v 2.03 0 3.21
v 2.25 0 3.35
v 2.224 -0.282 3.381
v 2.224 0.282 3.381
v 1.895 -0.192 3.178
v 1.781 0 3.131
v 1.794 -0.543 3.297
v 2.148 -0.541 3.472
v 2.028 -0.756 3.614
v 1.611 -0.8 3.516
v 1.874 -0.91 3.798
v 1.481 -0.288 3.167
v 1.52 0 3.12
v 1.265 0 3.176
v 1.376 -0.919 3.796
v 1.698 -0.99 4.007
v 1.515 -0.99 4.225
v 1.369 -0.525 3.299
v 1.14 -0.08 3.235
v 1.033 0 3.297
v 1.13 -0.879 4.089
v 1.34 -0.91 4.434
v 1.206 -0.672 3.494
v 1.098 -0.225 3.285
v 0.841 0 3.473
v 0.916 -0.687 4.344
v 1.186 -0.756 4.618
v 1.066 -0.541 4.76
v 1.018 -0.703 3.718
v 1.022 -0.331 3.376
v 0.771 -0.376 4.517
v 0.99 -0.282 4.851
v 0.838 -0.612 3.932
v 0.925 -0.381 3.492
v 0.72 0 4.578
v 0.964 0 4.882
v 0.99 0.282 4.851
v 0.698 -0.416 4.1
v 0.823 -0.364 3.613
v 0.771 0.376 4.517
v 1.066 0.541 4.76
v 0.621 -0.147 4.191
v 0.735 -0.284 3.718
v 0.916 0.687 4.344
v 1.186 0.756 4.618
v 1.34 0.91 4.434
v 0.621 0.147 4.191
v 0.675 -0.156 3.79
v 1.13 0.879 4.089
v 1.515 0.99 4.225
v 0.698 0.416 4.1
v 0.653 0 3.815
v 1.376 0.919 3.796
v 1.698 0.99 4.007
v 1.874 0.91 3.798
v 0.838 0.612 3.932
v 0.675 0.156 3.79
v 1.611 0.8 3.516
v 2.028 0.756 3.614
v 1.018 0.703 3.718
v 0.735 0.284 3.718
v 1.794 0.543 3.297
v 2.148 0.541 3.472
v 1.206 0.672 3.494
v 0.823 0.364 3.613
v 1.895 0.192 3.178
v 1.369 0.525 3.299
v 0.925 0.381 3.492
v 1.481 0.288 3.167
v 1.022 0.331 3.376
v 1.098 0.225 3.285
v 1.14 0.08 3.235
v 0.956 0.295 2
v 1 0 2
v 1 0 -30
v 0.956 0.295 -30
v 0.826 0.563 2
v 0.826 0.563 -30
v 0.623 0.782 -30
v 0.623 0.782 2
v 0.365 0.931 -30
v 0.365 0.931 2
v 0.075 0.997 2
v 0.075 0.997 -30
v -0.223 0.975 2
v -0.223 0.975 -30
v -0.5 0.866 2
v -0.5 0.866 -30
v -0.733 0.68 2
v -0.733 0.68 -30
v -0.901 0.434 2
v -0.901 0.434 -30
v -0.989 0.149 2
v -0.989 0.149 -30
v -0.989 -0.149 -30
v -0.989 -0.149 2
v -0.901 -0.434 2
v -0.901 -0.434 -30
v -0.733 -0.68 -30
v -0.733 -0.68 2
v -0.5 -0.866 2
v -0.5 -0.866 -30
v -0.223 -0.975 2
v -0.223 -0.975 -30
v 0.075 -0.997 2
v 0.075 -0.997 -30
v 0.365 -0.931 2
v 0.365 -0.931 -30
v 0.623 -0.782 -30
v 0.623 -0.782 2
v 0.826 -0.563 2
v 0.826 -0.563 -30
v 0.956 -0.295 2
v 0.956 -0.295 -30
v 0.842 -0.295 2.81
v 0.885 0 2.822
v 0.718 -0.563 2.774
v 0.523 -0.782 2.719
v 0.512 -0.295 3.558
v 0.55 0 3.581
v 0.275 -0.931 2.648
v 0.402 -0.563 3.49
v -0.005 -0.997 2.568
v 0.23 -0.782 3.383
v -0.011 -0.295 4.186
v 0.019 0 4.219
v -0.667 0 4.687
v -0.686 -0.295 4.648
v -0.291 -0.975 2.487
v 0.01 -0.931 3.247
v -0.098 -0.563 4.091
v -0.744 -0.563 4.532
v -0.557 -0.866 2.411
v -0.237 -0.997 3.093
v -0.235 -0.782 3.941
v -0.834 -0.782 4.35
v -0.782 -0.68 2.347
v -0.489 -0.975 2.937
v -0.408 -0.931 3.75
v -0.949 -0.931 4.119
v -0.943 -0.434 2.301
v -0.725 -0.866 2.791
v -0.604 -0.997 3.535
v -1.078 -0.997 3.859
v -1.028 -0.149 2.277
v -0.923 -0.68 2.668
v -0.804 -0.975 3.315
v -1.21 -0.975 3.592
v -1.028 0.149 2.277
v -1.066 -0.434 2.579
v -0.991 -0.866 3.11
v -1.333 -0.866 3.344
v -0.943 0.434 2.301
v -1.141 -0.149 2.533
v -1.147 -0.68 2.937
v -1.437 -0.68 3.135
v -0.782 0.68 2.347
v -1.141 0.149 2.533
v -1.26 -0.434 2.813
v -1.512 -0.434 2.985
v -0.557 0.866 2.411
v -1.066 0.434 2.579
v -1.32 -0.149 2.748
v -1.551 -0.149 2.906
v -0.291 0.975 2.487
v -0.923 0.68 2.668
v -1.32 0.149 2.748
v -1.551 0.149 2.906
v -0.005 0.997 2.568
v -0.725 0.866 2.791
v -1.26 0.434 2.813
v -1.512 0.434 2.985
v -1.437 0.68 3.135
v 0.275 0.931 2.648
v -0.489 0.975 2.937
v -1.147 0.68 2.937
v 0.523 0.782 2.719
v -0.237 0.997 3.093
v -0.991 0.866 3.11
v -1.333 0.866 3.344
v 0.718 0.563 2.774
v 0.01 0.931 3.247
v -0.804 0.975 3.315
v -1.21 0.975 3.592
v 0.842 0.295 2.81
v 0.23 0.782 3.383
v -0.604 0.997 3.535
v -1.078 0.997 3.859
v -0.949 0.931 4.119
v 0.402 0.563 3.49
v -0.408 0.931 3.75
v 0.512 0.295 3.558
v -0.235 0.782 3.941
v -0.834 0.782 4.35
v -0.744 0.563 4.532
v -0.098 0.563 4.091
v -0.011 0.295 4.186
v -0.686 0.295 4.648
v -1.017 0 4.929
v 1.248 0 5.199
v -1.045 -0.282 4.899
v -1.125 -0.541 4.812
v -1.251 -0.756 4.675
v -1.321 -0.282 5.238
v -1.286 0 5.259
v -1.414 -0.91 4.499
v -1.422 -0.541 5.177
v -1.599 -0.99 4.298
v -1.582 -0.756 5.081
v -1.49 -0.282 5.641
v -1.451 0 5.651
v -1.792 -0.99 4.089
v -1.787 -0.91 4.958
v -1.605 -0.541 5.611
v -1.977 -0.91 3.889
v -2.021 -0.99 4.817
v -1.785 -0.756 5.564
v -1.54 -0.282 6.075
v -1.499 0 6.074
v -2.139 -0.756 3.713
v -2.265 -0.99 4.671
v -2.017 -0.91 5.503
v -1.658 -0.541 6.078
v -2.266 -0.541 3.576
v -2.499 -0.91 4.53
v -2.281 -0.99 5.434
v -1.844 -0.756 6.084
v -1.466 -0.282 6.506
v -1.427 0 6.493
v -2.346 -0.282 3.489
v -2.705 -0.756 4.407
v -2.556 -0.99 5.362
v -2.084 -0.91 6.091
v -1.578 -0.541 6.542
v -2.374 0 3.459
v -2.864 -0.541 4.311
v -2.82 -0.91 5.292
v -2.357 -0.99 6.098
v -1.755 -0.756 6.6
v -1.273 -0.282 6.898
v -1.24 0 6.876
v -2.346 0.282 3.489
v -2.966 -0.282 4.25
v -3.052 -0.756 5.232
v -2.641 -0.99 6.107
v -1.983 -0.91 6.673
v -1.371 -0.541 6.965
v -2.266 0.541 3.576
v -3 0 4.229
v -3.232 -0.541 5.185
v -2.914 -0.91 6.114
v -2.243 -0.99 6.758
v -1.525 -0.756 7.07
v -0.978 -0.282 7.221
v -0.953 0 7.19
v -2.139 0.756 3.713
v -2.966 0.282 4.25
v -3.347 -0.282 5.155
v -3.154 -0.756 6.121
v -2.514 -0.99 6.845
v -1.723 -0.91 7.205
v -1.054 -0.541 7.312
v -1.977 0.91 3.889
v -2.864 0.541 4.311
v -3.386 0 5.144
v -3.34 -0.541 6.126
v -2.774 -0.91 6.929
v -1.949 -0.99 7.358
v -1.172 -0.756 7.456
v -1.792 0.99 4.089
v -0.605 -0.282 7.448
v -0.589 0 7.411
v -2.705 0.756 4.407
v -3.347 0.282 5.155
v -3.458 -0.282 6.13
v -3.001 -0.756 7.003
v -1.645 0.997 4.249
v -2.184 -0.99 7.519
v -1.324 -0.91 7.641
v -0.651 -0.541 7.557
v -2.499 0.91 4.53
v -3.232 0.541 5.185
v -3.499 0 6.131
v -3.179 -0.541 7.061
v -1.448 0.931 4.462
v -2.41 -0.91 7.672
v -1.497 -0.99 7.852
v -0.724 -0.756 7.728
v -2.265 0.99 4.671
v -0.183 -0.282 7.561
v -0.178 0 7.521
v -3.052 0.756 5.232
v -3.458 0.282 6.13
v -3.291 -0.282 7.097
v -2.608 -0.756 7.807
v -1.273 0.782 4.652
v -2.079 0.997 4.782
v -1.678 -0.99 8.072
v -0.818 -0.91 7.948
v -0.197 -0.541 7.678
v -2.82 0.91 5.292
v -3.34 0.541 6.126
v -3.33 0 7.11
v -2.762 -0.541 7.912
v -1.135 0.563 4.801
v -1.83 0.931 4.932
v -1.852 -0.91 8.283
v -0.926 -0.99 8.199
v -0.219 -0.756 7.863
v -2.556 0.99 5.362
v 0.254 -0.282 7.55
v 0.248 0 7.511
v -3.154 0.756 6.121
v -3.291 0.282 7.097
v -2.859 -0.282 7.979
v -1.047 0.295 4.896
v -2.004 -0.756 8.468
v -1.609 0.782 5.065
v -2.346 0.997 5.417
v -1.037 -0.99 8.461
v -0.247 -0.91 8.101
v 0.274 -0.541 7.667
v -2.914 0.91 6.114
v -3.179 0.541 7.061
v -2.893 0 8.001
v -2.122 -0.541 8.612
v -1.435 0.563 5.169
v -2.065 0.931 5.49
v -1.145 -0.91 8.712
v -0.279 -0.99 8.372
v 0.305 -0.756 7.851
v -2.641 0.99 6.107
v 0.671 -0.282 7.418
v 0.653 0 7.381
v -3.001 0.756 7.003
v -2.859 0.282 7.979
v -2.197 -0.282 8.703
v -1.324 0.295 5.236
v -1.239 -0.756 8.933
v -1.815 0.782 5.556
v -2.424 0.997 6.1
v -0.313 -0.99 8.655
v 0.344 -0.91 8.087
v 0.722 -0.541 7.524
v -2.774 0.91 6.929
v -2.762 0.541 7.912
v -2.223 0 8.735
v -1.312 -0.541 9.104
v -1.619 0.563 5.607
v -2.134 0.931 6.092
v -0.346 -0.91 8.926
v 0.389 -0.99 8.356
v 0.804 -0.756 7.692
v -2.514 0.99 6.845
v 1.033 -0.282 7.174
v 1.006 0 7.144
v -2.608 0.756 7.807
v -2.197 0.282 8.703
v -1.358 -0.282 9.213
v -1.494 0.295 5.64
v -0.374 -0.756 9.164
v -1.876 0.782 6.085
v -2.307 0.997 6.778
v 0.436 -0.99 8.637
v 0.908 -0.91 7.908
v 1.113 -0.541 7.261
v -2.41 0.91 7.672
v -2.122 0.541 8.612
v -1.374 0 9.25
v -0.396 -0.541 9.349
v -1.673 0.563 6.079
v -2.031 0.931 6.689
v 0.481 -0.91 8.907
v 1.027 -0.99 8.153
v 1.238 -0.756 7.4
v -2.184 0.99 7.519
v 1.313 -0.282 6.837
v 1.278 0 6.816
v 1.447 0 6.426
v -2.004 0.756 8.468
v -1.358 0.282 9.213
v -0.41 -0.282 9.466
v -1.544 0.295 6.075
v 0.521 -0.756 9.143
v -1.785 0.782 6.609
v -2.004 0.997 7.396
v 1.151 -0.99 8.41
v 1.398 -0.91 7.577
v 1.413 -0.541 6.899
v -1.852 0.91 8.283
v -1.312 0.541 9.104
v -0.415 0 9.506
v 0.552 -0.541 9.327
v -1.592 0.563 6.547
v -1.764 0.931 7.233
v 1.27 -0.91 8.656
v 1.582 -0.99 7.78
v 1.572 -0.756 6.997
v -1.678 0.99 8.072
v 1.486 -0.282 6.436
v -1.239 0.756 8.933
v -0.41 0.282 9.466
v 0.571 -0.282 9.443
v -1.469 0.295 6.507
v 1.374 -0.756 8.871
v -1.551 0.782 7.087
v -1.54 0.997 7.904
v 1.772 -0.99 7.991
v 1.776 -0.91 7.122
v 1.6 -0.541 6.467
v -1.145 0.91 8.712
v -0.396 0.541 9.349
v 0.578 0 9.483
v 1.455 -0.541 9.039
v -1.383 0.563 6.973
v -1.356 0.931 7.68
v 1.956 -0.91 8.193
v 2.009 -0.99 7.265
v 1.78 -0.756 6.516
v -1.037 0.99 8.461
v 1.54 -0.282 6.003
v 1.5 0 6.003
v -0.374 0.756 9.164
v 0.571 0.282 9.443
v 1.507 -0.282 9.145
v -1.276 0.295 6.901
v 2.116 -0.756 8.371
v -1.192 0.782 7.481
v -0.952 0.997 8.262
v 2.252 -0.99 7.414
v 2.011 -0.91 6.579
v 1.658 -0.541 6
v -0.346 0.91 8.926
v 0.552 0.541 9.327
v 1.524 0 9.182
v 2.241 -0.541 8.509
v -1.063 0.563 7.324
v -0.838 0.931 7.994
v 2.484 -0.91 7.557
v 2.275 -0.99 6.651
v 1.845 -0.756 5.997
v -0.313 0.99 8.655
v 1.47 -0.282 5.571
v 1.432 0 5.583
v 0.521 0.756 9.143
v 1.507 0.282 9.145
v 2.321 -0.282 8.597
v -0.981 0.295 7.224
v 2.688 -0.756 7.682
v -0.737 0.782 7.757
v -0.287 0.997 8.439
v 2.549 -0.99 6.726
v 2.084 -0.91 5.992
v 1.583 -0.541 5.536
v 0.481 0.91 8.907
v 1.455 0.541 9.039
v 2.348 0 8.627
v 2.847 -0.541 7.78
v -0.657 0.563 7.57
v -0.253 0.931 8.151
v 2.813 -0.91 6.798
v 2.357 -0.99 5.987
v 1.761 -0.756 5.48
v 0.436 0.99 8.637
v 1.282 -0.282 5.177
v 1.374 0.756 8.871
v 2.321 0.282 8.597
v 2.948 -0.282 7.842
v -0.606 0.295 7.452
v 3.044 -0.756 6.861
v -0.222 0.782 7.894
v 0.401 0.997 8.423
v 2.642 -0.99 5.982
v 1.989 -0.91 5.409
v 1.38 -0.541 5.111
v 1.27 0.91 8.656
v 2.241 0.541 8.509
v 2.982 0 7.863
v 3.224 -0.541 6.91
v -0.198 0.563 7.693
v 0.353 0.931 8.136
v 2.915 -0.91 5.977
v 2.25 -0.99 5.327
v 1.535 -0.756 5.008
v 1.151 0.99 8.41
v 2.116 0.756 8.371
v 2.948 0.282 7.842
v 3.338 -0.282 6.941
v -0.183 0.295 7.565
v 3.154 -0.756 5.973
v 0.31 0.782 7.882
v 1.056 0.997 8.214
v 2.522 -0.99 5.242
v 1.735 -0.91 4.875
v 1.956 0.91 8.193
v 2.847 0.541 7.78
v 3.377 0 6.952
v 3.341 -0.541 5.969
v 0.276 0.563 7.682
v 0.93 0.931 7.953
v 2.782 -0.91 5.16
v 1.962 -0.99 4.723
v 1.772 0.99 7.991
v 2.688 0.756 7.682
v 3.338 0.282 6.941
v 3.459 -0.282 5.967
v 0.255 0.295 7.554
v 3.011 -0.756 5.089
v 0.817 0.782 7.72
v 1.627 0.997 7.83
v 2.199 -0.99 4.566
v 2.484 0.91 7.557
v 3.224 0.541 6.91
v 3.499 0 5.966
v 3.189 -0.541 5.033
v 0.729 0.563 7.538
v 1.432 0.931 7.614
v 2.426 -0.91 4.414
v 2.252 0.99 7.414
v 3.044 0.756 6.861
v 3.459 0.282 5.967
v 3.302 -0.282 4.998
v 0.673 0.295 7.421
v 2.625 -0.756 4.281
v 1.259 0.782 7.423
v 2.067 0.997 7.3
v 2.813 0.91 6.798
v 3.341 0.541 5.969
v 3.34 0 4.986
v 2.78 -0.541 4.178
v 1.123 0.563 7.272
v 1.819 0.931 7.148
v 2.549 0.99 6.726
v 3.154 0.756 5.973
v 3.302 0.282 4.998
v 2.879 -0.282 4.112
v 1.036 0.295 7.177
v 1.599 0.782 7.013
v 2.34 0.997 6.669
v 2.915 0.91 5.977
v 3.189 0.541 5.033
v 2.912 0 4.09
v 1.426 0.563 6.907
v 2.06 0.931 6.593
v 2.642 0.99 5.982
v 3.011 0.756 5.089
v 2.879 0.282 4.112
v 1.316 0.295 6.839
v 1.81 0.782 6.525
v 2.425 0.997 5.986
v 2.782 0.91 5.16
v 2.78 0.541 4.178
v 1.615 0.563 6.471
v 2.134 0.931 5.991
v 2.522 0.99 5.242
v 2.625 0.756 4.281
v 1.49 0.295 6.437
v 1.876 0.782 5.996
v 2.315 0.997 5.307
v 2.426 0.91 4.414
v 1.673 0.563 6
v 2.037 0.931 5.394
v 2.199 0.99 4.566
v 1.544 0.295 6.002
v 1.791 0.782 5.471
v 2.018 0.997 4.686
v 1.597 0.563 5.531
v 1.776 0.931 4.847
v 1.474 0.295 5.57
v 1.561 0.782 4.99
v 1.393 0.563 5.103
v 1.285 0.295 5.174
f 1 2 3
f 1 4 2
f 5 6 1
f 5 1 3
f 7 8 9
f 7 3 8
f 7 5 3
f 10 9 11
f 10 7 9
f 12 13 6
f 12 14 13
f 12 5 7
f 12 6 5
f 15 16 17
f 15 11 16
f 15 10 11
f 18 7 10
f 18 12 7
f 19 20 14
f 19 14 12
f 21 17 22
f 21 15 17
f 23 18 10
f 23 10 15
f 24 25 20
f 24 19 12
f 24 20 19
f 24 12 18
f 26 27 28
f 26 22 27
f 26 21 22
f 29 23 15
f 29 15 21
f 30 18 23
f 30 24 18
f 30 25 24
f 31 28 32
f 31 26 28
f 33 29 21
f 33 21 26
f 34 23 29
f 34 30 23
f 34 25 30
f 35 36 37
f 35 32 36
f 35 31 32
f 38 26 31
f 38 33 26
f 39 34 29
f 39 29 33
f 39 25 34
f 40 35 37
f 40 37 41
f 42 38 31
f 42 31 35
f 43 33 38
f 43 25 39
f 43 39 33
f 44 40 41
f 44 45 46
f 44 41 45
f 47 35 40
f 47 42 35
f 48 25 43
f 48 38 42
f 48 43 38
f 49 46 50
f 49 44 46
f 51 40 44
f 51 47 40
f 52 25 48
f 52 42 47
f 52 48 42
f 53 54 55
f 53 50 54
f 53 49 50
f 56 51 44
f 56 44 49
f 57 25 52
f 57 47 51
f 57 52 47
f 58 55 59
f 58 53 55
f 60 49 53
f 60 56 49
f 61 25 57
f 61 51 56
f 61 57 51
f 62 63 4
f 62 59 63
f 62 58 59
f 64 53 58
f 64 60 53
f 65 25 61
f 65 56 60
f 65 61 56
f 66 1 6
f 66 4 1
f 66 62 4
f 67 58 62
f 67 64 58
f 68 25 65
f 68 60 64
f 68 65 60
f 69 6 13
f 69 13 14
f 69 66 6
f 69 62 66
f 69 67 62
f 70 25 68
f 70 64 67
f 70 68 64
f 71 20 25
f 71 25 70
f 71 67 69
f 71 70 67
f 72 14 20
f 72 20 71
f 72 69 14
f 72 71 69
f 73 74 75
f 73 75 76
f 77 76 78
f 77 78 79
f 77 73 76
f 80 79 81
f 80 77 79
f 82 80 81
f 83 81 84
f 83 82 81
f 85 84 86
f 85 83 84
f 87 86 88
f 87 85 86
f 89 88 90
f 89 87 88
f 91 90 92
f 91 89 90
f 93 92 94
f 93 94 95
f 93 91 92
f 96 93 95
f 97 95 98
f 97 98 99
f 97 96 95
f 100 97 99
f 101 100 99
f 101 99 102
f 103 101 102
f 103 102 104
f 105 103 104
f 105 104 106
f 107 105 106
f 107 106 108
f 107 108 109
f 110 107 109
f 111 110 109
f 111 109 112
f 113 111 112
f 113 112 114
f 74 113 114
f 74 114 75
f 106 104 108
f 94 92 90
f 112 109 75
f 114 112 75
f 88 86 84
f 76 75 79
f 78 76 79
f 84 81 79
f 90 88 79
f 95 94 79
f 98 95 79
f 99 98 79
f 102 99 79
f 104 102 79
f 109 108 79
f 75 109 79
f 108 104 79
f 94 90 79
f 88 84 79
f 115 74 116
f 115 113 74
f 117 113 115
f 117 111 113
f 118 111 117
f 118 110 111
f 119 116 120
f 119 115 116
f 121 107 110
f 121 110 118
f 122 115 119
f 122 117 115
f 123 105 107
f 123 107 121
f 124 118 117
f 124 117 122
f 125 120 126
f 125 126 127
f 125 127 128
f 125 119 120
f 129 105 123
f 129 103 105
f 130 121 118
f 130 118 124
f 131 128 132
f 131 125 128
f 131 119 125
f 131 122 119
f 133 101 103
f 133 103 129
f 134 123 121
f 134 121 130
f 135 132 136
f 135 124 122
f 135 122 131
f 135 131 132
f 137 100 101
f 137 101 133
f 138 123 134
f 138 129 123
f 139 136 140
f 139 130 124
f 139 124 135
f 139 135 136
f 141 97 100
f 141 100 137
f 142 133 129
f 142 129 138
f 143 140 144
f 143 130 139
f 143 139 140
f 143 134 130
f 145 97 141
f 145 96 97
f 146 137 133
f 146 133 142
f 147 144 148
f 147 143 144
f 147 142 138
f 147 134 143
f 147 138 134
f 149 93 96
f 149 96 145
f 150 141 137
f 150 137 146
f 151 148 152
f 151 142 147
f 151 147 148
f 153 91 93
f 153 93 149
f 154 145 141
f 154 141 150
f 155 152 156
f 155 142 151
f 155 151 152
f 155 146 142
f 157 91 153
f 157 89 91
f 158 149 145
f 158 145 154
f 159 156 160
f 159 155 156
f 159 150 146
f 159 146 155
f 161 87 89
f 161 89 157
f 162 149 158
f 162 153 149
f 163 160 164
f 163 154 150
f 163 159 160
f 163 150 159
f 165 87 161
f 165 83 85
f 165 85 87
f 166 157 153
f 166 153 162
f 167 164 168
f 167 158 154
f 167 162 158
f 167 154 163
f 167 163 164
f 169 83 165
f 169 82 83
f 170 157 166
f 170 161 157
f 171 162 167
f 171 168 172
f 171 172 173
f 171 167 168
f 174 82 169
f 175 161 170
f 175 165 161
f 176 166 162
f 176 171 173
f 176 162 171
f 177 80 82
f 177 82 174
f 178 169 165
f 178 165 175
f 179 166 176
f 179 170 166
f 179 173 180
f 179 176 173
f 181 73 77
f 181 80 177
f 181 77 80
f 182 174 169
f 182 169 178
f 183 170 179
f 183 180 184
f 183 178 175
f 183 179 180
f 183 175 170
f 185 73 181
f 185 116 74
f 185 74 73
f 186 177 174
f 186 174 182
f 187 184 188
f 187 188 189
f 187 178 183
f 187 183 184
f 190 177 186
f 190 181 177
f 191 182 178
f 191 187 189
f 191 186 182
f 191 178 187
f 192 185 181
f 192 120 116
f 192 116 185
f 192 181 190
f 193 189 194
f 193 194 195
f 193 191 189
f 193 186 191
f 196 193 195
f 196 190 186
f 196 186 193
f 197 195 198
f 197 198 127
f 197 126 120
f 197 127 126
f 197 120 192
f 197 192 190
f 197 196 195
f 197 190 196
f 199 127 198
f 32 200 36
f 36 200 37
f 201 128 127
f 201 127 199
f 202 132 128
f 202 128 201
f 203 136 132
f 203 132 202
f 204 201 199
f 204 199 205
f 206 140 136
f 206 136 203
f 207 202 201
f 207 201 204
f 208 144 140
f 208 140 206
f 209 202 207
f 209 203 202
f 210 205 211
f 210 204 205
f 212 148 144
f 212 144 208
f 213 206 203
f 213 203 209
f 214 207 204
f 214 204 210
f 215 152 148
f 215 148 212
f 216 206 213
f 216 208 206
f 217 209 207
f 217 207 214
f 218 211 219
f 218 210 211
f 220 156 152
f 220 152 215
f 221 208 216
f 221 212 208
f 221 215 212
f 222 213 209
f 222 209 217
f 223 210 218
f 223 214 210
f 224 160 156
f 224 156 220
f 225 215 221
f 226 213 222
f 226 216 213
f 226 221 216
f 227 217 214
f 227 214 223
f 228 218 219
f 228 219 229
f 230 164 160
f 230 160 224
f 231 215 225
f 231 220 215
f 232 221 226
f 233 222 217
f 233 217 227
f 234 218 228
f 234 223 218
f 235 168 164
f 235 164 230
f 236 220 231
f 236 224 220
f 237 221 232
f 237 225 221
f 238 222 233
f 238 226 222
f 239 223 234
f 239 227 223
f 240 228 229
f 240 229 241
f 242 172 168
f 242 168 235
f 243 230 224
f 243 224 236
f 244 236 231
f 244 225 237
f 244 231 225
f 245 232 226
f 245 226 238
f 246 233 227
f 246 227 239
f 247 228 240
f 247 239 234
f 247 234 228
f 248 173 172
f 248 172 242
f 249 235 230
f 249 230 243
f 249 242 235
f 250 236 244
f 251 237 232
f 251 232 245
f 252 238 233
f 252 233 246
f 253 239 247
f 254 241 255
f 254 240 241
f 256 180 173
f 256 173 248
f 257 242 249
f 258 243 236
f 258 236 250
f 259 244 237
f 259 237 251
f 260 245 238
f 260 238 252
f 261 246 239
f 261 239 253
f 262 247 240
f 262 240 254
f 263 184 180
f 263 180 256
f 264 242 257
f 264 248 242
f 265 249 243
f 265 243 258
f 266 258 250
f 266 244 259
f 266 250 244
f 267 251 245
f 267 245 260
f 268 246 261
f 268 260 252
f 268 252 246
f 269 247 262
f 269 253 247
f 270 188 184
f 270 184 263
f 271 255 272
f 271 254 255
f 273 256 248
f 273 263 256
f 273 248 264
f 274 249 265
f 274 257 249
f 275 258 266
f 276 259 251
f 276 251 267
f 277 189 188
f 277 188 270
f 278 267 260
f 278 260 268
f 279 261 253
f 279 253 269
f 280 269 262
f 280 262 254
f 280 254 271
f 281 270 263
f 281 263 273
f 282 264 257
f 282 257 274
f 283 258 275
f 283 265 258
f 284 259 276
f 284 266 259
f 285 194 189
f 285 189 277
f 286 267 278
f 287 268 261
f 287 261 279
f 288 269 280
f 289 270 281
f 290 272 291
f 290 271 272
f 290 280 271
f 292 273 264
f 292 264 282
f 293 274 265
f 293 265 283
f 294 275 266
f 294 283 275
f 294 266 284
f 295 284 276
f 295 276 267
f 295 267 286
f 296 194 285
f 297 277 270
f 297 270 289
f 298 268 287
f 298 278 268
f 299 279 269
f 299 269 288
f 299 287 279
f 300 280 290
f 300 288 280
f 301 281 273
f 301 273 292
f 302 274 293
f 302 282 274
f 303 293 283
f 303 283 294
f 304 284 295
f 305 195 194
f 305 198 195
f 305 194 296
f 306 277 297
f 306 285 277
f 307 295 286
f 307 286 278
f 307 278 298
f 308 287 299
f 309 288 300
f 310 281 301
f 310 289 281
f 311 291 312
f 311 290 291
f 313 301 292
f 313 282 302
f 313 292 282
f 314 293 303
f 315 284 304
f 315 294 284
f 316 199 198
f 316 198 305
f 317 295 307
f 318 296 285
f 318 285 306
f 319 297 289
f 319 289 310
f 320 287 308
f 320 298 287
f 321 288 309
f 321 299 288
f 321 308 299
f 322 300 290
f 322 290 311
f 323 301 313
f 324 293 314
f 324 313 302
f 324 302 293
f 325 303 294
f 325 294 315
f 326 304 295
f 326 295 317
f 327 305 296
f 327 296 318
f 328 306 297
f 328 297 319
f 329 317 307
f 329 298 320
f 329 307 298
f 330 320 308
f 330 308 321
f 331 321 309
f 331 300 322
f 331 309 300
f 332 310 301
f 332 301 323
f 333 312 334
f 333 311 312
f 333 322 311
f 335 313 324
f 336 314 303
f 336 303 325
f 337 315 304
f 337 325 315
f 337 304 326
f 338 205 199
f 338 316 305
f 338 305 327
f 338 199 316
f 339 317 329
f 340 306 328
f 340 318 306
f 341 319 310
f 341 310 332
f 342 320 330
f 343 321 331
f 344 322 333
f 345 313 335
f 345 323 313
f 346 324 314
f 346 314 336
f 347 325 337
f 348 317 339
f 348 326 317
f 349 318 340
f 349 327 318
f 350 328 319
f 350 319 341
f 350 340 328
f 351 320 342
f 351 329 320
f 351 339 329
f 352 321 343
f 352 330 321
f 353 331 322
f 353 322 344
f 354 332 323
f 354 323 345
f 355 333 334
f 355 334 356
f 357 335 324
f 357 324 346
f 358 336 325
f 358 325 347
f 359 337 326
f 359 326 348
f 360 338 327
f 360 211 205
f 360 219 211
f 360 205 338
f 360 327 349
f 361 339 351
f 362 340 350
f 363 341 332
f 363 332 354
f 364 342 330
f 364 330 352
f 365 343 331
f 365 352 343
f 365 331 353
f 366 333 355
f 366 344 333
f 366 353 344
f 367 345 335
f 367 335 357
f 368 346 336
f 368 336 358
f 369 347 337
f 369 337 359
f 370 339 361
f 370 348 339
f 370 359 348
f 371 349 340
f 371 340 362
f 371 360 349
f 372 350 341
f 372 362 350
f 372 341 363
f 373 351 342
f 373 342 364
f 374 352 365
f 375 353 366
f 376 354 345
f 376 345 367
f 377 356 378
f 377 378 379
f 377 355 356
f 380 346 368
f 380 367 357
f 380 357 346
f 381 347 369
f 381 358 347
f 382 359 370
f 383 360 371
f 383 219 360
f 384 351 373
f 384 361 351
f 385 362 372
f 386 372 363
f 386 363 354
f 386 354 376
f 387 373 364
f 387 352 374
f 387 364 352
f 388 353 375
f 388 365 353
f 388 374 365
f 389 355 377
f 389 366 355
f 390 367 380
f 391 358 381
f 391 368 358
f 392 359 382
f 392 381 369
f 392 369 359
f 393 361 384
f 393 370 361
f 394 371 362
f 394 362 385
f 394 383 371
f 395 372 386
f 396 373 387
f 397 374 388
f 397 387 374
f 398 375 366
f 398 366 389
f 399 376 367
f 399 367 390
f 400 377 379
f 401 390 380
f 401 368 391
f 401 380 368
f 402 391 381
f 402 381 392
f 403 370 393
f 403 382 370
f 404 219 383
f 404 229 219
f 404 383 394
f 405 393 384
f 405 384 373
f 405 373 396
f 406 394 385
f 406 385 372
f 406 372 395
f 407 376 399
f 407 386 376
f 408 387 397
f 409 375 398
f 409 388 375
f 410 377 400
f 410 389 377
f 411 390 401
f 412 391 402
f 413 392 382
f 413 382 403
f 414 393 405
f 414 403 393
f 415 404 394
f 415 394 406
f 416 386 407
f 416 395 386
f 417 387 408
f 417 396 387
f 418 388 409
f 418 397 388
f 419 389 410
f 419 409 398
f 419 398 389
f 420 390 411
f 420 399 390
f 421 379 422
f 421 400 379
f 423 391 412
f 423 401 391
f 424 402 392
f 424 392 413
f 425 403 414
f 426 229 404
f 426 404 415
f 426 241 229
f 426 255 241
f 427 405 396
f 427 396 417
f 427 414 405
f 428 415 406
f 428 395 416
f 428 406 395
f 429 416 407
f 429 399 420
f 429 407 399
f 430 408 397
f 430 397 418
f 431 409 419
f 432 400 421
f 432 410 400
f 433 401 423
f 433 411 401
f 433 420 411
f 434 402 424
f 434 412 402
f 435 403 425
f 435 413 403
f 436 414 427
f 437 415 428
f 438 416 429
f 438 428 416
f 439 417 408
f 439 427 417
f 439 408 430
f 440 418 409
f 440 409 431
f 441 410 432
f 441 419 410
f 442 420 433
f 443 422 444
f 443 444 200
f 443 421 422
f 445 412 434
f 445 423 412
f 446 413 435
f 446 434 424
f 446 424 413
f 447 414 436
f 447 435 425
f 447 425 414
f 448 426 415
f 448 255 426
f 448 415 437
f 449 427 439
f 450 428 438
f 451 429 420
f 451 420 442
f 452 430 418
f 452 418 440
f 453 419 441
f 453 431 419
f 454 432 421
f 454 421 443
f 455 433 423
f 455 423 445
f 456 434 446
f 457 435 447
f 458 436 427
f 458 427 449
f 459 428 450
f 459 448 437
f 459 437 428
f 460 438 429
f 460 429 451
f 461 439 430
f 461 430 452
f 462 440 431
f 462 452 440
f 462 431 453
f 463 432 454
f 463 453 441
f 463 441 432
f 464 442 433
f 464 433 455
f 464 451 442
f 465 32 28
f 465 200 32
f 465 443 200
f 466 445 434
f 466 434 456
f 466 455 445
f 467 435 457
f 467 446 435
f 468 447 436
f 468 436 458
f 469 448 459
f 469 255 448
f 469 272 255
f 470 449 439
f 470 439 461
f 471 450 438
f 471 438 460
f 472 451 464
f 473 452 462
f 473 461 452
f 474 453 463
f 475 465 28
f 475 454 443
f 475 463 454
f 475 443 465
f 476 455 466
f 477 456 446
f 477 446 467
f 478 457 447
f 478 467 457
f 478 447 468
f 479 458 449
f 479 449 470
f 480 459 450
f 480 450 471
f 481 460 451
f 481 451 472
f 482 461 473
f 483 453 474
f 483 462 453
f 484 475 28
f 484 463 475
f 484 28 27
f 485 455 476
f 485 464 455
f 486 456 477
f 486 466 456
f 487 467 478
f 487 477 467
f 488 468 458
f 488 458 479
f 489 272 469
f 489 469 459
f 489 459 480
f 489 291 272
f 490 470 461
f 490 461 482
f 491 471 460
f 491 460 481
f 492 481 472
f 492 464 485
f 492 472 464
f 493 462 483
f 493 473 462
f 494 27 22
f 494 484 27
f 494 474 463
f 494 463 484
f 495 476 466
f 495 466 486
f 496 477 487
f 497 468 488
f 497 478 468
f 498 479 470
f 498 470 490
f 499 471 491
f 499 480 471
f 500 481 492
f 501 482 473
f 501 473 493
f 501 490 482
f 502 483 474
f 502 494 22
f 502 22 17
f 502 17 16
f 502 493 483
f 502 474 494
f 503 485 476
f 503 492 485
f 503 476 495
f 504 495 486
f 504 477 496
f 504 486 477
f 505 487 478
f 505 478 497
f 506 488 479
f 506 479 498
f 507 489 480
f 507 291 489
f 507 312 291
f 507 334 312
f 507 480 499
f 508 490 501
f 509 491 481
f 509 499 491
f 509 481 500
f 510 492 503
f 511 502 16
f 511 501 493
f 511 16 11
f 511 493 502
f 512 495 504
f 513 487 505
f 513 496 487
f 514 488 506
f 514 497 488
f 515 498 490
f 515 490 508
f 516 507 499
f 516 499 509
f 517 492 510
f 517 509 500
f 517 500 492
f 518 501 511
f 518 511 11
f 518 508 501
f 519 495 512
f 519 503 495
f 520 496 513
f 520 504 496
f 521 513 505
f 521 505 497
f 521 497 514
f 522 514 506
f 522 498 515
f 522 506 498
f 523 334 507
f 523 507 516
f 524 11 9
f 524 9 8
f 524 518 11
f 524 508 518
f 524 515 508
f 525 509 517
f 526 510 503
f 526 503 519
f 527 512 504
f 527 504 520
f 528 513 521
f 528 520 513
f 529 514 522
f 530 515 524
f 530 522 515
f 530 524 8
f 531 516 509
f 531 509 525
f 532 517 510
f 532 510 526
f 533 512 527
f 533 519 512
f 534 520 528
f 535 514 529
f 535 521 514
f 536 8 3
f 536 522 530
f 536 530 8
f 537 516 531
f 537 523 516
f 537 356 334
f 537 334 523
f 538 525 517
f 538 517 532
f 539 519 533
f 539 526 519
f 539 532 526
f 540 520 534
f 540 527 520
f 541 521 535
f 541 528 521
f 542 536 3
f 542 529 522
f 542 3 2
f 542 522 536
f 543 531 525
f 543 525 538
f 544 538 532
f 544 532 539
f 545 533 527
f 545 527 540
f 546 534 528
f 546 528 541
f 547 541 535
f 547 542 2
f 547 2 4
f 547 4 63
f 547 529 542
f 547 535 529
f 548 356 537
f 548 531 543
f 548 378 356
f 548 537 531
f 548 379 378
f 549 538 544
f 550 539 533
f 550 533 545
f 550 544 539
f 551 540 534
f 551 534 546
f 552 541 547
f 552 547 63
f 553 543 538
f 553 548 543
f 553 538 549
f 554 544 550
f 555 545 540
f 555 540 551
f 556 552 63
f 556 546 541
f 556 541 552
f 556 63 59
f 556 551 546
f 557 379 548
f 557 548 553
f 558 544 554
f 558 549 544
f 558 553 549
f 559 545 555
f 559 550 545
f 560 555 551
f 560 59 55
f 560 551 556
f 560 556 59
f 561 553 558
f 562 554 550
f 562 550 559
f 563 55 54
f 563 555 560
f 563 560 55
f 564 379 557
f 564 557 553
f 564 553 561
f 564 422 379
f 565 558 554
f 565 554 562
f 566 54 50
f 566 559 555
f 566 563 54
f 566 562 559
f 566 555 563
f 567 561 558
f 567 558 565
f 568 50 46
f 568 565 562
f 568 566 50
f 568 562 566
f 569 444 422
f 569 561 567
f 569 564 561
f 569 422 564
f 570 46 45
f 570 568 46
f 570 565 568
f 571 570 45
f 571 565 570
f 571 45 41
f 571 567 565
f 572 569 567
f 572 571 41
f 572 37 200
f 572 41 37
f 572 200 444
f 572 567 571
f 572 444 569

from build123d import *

# Parameters (mm, degrees)
SKETCH1_R           = 1
BOSS_EXTRUDE1_DEPTH = 30
SKETCH1_2_R         = 1
DOME2_FACE_RADIUS   = 1
DOME2_HEIGHT        = 1


with BuildPart() as part:
    # Sketch1 → Boss-Extrude1 (new body)
    with BuildSketch(Plane.XY):
        Circle(SKETCH1_R)
    extrude(amount=-BOSS_EXTRUDE1_DEPTH)

    # Sweep1: sweep along a path in Sketch3
    with BuildLine(Plane(origin=(0, 0, 0), x_dir=(1, 0, 0), z_dir=(0, 1, 0))) as sweep1_path:
        Line((0, 0), (0, -2))
        ThreePointArc((0, -2), (-0.300326829, -3.054092553), (-1.111111111, -3.791612833))
        ThreePointArc((-1.111111111, -3.791612833), (-0.29627421, -8.513511116), (1.606969024, -4.116017766))
    # Sketch1<2> → Sweep1 (sweep)
    with BuildSketch(Plane.XY):
        Circle(SKETCH1_2_R)
    sweep(path=sweep1_path.line)

    # Dome2: a dome of height H over a round flat face of radius A is a cap of a sphere of radius (A * A + H * H) / (2 * H)
    dome2_r = (DOME2_FACE_RADIUS * DOME2_FACE_RADIUS + DOME2_HEIGHT * DOME2_HEIGHT) / (2 * DOME2_HEIGHT)
    dome2_base = Plane((1.606969024, 0, 4.116017766), z_dir=(-0.766044443119, 0, -0.642787609687))
    with Locations(dome2_base.offset(DOME2_HEIGHT - dome2_r)):
        dome2_ball = Sphere(dome2_r, mode=Mode.PRIVATE)
    add(split(dome2_ball, bisect_by=dome2_base, keep=Keep.TOP, mode=Mode.PRIVATE))


solid = part.part
